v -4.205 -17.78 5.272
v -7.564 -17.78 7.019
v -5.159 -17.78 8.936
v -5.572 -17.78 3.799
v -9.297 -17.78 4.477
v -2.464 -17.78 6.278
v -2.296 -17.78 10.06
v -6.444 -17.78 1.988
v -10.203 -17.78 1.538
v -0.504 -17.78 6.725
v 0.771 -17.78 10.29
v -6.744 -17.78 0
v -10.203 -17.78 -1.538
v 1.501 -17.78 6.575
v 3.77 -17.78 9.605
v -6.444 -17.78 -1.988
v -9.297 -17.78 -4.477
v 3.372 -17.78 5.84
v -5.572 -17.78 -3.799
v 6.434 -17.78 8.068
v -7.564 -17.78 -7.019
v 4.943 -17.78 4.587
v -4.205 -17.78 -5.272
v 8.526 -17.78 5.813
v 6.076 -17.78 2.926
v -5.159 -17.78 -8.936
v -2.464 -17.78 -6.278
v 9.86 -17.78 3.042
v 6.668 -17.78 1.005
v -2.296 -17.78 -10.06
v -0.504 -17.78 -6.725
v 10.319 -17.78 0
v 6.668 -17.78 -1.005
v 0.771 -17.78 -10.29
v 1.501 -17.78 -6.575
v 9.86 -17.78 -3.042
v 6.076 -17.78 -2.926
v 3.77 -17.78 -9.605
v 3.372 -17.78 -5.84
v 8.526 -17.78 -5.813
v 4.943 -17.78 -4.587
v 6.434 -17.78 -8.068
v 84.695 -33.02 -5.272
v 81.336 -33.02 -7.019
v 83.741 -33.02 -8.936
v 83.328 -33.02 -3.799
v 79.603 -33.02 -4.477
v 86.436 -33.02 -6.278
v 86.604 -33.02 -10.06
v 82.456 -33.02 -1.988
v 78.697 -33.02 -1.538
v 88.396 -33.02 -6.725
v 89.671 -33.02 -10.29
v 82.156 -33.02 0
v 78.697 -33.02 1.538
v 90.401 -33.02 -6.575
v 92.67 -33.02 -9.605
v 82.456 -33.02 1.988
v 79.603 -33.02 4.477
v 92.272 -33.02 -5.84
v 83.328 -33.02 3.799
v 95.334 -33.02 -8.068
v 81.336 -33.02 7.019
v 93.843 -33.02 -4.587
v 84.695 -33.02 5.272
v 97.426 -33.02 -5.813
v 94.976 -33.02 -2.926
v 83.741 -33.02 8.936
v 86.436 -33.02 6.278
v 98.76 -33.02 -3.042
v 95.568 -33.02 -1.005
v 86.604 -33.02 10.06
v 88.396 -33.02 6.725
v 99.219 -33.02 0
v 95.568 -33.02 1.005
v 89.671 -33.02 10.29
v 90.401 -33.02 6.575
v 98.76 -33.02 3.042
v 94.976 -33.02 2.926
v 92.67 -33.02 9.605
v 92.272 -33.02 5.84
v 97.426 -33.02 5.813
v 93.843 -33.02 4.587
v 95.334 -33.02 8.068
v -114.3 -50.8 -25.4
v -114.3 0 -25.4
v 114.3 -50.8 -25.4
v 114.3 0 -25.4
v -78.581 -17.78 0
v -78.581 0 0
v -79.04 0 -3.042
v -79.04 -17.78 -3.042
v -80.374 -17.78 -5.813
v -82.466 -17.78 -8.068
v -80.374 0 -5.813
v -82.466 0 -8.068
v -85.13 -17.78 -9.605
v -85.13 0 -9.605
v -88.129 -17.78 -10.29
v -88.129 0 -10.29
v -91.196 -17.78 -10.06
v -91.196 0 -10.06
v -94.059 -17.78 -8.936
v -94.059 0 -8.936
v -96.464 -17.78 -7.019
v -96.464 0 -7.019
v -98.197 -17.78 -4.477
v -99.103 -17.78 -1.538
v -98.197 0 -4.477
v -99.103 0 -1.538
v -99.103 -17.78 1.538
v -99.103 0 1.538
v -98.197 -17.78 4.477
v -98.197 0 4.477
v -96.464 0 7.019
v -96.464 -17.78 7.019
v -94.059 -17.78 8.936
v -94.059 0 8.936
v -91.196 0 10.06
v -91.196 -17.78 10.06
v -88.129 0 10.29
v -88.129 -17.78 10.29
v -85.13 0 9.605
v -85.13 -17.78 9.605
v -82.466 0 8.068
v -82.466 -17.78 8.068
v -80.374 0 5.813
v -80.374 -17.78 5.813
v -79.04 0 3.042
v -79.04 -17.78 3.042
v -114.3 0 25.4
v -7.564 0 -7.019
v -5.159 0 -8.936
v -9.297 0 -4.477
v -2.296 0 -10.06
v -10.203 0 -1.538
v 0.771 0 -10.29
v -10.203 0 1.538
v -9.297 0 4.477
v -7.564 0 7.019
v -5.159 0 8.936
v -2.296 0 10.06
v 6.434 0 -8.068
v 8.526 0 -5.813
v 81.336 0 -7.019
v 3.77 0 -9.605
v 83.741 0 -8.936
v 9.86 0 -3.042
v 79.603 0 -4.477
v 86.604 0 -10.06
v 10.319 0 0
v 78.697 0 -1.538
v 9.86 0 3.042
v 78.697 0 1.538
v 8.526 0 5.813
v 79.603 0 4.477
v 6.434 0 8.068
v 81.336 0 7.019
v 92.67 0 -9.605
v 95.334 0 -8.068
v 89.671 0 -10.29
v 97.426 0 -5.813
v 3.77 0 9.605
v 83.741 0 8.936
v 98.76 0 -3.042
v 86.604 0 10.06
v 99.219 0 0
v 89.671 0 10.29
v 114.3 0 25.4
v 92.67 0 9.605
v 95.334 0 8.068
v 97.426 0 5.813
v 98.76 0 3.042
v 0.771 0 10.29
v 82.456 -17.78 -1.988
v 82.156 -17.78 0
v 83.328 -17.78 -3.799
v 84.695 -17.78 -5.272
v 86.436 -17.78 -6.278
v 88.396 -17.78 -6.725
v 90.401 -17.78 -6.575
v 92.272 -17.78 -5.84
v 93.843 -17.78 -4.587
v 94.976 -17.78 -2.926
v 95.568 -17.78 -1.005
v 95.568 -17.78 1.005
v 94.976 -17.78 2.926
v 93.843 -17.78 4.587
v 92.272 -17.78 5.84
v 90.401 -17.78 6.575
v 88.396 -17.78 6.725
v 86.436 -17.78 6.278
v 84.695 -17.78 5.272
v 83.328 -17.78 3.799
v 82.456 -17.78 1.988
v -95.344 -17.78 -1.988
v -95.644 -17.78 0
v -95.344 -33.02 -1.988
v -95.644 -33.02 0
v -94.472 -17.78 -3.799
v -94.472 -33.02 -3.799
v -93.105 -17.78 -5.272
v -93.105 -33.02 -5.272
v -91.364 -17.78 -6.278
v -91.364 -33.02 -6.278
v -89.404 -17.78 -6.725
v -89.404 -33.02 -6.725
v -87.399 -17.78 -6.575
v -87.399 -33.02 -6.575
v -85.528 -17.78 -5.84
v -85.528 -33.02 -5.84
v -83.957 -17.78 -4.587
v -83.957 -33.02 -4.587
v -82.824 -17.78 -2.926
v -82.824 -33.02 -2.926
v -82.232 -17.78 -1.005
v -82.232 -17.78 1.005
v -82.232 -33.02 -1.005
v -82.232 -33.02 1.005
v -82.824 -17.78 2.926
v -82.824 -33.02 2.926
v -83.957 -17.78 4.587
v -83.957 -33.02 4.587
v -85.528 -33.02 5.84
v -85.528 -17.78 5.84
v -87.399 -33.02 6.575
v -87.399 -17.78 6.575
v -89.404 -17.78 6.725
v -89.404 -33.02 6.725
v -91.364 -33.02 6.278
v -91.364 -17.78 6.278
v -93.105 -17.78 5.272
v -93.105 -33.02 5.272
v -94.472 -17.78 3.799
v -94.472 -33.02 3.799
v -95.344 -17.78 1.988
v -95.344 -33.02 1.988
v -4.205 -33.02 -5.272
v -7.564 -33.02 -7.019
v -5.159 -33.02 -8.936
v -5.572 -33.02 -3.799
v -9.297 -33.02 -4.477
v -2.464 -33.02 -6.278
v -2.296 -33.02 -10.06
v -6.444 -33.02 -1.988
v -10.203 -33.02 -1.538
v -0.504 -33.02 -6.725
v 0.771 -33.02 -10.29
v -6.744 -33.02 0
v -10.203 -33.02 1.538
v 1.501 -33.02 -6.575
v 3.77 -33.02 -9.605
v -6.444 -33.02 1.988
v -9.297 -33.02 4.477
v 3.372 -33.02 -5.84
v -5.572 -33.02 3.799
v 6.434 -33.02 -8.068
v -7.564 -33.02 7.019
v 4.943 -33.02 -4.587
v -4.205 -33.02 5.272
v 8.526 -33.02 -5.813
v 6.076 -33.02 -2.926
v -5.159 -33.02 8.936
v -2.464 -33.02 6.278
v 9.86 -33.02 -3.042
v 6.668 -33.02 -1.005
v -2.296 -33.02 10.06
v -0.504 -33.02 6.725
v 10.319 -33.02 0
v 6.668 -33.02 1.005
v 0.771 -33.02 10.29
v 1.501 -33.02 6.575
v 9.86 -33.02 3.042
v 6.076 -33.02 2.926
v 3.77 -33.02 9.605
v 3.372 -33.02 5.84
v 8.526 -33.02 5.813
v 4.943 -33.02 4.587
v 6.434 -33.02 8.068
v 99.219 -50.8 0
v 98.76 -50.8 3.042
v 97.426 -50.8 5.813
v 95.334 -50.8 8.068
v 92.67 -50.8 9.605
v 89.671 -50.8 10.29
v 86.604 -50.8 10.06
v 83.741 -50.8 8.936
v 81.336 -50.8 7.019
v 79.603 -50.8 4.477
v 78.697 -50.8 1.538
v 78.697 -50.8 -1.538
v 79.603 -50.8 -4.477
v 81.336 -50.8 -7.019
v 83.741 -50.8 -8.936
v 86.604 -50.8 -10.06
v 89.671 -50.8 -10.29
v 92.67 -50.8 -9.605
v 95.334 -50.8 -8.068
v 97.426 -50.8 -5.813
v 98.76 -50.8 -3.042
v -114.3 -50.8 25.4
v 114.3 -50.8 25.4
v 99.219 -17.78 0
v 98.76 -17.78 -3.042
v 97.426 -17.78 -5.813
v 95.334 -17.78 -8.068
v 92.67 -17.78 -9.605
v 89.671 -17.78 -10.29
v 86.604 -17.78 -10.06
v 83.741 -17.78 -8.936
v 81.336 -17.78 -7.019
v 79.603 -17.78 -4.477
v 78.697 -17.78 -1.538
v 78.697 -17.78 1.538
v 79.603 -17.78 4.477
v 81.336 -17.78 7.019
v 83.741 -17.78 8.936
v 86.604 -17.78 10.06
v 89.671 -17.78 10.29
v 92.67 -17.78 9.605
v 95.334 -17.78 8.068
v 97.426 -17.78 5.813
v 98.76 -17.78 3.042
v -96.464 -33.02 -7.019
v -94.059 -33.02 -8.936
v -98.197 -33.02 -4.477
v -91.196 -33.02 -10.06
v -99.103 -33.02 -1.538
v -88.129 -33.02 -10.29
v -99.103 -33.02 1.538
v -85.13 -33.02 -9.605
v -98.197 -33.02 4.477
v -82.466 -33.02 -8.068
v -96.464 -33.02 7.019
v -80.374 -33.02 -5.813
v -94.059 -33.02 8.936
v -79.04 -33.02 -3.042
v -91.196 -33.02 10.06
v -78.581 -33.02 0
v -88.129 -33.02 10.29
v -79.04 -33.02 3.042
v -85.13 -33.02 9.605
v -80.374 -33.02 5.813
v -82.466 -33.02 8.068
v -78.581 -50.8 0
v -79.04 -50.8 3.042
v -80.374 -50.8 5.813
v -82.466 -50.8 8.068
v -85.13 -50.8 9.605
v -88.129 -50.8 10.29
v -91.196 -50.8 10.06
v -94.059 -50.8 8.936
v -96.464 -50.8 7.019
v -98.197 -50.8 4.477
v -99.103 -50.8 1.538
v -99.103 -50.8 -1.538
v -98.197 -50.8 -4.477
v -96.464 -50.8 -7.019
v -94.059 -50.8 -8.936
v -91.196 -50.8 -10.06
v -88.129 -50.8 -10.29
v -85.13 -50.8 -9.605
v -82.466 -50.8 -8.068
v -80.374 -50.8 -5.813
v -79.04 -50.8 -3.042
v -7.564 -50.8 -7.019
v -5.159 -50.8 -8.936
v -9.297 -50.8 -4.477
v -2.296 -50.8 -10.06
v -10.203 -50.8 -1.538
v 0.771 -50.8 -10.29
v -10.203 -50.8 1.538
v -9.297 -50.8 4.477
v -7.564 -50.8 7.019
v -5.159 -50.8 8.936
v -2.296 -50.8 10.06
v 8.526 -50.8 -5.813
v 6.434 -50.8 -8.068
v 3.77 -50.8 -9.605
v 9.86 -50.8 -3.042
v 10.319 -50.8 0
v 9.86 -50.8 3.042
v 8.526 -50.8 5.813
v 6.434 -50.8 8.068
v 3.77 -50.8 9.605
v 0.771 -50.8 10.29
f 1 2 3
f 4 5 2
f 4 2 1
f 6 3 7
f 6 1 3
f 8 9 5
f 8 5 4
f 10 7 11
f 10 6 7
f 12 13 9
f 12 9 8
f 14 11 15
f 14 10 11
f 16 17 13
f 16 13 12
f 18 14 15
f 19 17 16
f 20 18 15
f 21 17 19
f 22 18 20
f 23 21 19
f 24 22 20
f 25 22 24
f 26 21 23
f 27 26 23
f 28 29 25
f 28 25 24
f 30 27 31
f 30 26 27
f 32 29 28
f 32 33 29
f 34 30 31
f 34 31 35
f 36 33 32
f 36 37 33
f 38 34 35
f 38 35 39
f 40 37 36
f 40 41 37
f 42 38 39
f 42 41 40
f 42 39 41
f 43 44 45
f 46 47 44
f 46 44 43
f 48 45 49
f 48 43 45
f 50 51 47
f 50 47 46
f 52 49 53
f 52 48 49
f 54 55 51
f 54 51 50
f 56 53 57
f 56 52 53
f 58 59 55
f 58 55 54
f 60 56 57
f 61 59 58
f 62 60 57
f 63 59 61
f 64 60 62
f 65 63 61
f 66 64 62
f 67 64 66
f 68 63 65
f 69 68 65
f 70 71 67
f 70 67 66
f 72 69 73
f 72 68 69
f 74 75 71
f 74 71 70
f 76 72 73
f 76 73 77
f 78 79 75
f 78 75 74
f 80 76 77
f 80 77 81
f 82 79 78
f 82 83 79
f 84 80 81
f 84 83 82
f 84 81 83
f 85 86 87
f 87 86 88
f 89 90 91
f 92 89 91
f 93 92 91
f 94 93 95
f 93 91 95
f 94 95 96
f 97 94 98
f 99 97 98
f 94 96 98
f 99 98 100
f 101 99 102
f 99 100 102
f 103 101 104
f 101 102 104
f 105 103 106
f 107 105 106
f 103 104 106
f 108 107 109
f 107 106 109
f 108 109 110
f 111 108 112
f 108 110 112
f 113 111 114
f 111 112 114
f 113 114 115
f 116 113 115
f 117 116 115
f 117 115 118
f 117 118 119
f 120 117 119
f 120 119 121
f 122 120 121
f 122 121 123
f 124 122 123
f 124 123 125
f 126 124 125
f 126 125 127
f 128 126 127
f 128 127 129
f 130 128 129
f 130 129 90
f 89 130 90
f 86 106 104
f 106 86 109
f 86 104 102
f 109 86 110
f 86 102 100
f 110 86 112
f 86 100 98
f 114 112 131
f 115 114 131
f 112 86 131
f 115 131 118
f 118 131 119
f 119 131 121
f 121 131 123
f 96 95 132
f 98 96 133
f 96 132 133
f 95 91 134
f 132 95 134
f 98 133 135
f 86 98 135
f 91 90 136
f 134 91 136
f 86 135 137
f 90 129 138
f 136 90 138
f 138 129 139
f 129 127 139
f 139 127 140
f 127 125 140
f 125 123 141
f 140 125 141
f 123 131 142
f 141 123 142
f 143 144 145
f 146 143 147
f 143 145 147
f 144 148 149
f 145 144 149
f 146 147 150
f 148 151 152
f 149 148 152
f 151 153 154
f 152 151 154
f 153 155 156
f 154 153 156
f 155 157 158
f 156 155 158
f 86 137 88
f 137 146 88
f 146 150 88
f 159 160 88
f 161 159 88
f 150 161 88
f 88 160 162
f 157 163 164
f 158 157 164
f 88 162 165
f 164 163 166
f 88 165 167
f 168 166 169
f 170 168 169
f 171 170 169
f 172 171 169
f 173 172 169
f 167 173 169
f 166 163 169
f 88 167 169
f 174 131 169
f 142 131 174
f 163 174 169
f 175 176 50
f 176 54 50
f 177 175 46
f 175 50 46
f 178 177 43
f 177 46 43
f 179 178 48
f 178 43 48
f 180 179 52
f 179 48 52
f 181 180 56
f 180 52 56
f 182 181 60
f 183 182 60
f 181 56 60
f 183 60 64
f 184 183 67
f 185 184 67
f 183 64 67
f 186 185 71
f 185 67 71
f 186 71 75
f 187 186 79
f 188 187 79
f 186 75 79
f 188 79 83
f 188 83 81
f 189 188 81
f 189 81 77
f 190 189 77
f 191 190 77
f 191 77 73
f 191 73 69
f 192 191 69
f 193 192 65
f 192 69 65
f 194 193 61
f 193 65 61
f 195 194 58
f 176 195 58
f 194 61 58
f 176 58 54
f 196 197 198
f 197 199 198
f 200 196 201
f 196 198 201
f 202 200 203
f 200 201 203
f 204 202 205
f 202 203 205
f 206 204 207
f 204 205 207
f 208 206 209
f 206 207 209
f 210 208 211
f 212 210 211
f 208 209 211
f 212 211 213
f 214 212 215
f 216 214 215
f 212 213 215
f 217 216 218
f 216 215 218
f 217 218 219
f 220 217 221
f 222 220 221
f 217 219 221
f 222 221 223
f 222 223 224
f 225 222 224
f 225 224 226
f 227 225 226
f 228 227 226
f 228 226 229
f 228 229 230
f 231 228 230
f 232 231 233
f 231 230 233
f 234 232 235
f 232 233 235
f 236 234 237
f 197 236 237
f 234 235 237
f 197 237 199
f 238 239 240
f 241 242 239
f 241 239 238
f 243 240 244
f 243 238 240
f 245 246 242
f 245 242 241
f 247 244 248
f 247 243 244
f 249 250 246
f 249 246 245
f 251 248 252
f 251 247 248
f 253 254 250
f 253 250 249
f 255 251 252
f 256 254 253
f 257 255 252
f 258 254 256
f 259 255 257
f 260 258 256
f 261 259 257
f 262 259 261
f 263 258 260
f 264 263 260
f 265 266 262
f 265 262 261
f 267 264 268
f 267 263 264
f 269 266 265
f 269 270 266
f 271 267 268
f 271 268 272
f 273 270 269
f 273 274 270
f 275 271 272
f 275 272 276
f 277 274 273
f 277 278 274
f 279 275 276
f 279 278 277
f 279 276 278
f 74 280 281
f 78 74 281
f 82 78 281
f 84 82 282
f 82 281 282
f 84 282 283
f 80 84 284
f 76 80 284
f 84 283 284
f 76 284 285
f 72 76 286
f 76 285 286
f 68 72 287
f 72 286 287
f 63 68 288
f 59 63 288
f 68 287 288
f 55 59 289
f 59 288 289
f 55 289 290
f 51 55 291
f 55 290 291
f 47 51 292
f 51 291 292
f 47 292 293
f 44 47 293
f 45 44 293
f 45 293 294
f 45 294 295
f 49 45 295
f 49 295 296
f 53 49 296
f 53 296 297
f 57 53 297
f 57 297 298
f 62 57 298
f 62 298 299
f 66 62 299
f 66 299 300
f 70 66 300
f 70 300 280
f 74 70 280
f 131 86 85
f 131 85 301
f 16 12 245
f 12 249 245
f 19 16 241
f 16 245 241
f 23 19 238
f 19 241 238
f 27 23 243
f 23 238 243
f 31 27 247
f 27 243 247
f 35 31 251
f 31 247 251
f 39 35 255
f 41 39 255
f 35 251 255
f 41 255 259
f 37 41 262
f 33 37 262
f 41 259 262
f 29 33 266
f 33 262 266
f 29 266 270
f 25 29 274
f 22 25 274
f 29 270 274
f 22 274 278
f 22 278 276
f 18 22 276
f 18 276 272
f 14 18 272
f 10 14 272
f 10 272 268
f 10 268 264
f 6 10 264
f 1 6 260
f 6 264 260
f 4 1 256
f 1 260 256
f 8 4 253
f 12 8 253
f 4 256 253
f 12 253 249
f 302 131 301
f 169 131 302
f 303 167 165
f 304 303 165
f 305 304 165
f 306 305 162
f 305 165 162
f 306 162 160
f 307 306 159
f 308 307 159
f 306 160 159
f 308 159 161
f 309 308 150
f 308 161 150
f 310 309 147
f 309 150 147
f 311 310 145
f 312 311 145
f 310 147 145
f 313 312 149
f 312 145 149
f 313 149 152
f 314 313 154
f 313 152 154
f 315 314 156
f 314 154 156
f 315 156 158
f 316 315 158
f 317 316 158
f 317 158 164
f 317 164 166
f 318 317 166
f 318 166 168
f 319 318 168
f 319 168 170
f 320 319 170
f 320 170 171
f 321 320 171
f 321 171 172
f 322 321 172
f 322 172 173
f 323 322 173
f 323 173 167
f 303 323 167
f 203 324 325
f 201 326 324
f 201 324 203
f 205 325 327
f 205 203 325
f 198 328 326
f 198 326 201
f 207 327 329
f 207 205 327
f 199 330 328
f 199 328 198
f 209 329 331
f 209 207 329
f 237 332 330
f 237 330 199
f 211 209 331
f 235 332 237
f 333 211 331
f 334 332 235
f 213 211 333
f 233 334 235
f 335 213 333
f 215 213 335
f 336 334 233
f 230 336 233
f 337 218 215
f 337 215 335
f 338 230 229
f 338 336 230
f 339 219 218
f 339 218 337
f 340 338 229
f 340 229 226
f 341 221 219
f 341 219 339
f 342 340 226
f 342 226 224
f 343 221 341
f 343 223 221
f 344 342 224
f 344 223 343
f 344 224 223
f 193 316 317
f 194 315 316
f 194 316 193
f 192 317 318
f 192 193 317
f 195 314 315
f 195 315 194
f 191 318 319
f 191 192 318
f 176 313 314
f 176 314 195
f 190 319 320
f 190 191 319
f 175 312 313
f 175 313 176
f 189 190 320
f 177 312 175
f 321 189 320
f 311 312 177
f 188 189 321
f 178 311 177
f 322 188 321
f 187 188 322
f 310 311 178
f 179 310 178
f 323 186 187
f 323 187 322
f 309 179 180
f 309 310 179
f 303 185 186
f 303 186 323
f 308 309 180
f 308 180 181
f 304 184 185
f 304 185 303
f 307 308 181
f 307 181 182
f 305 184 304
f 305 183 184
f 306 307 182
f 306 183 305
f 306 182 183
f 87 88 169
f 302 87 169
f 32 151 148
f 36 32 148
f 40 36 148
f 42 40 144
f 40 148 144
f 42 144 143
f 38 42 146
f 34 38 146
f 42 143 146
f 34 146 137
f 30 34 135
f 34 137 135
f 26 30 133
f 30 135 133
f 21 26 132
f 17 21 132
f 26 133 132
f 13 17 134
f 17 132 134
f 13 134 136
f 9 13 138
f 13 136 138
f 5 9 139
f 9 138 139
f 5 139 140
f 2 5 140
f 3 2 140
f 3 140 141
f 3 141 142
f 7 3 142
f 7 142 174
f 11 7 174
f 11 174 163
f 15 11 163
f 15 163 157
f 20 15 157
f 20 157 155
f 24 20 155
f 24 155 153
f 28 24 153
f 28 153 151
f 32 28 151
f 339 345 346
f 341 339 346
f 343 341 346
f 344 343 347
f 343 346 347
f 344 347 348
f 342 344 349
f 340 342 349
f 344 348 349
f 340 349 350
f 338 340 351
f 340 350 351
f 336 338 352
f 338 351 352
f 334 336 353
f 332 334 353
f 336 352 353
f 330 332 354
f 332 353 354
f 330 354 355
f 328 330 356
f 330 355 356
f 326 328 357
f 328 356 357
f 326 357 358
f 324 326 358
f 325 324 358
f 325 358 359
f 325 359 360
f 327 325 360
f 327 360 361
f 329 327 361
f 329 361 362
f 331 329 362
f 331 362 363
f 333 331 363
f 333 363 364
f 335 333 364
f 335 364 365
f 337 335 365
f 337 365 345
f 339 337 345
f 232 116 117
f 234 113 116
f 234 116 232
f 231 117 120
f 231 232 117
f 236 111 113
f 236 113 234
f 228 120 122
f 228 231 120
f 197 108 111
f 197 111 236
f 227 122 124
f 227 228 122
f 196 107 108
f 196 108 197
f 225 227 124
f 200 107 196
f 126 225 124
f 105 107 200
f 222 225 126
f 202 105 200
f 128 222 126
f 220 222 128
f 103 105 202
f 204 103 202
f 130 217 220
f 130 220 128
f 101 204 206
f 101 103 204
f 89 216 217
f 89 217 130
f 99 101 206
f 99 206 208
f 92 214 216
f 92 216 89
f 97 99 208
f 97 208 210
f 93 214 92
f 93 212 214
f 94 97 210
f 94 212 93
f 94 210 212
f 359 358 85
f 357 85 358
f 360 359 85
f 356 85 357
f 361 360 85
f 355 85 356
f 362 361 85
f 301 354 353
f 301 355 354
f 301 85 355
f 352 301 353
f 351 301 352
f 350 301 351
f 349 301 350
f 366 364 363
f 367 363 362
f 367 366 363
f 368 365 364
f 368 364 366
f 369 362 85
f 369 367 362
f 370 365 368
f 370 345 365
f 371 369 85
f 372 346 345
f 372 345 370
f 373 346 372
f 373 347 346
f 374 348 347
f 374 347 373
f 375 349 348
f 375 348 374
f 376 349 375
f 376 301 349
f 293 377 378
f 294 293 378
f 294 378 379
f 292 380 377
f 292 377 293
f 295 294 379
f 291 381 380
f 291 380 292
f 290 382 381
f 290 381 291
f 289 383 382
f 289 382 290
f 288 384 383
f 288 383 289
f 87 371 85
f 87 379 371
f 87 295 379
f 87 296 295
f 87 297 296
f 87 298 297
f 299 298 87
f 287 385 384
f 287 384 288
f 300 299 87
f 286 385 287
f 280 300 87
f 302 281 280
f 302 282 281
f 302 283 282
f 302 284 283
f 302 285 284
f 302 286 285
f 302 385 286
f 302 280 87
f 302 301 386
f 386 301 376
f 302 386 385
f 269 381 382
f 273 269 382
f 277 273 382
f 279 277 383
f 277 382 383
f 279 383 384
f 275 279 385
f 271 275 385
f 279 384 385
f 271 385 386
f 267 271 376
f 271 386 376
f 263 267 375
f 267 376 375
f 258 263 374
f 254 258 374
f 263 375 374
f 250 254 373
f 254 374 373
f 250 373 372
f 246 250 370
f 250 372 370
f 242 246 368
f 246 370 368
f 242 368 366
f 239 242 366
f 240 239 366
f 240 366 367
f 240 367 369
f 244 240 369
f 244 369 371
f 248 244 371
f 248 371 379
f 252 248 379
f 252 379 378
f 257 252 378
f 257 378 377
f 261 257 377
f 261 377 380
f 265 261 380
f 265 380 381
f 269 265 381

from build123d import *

# Parameters (mm, degrees)
F0_W           = 228.6
F0_H           = 50.8
F1_DEPTH       = 50.8
F3_D           = 13.4874
F3_CBORE_D     = 20.6375
F3_CBORE_DEPTH = 17.78
F5_D           = 13.4874
F5_DEPTH       = 25.4
F5_CBORE_D     = 20.6375
F5_CBORE_DEPTH = 17.78


with BuildPart() as f1:
    # F0 (on Front) → F1 (new body)
    with BuildSketch(Plane.XZ):
        Rectangle(F0_W, F0_H)
    extrude(amount=F1_DEPTH)

    # F3 (through all)
    with Locations(Plane.XZ.offset(50.8)):
        with Locations((-88.9, 0), (0, 0), (88.9, 0)):
            CounterBoreHole(F3_D / 2, F3_CBORE_D / 2, F3_CBORE_DEPTH)

    # F5
    with Locations(Plane(origin=(0, 0, 0), x_dir=(1, 0, 0), z_dir=(0, 1, 0))):
        with Locations((88.9, 0), (0, 0), (-88.9, 0)):
            CounterBoreHole(F5_D / 2, F5_CBORE_D / 2, F5_CBORE_DEPTH, depth=F5_DEPTH)


solid = f1.part
